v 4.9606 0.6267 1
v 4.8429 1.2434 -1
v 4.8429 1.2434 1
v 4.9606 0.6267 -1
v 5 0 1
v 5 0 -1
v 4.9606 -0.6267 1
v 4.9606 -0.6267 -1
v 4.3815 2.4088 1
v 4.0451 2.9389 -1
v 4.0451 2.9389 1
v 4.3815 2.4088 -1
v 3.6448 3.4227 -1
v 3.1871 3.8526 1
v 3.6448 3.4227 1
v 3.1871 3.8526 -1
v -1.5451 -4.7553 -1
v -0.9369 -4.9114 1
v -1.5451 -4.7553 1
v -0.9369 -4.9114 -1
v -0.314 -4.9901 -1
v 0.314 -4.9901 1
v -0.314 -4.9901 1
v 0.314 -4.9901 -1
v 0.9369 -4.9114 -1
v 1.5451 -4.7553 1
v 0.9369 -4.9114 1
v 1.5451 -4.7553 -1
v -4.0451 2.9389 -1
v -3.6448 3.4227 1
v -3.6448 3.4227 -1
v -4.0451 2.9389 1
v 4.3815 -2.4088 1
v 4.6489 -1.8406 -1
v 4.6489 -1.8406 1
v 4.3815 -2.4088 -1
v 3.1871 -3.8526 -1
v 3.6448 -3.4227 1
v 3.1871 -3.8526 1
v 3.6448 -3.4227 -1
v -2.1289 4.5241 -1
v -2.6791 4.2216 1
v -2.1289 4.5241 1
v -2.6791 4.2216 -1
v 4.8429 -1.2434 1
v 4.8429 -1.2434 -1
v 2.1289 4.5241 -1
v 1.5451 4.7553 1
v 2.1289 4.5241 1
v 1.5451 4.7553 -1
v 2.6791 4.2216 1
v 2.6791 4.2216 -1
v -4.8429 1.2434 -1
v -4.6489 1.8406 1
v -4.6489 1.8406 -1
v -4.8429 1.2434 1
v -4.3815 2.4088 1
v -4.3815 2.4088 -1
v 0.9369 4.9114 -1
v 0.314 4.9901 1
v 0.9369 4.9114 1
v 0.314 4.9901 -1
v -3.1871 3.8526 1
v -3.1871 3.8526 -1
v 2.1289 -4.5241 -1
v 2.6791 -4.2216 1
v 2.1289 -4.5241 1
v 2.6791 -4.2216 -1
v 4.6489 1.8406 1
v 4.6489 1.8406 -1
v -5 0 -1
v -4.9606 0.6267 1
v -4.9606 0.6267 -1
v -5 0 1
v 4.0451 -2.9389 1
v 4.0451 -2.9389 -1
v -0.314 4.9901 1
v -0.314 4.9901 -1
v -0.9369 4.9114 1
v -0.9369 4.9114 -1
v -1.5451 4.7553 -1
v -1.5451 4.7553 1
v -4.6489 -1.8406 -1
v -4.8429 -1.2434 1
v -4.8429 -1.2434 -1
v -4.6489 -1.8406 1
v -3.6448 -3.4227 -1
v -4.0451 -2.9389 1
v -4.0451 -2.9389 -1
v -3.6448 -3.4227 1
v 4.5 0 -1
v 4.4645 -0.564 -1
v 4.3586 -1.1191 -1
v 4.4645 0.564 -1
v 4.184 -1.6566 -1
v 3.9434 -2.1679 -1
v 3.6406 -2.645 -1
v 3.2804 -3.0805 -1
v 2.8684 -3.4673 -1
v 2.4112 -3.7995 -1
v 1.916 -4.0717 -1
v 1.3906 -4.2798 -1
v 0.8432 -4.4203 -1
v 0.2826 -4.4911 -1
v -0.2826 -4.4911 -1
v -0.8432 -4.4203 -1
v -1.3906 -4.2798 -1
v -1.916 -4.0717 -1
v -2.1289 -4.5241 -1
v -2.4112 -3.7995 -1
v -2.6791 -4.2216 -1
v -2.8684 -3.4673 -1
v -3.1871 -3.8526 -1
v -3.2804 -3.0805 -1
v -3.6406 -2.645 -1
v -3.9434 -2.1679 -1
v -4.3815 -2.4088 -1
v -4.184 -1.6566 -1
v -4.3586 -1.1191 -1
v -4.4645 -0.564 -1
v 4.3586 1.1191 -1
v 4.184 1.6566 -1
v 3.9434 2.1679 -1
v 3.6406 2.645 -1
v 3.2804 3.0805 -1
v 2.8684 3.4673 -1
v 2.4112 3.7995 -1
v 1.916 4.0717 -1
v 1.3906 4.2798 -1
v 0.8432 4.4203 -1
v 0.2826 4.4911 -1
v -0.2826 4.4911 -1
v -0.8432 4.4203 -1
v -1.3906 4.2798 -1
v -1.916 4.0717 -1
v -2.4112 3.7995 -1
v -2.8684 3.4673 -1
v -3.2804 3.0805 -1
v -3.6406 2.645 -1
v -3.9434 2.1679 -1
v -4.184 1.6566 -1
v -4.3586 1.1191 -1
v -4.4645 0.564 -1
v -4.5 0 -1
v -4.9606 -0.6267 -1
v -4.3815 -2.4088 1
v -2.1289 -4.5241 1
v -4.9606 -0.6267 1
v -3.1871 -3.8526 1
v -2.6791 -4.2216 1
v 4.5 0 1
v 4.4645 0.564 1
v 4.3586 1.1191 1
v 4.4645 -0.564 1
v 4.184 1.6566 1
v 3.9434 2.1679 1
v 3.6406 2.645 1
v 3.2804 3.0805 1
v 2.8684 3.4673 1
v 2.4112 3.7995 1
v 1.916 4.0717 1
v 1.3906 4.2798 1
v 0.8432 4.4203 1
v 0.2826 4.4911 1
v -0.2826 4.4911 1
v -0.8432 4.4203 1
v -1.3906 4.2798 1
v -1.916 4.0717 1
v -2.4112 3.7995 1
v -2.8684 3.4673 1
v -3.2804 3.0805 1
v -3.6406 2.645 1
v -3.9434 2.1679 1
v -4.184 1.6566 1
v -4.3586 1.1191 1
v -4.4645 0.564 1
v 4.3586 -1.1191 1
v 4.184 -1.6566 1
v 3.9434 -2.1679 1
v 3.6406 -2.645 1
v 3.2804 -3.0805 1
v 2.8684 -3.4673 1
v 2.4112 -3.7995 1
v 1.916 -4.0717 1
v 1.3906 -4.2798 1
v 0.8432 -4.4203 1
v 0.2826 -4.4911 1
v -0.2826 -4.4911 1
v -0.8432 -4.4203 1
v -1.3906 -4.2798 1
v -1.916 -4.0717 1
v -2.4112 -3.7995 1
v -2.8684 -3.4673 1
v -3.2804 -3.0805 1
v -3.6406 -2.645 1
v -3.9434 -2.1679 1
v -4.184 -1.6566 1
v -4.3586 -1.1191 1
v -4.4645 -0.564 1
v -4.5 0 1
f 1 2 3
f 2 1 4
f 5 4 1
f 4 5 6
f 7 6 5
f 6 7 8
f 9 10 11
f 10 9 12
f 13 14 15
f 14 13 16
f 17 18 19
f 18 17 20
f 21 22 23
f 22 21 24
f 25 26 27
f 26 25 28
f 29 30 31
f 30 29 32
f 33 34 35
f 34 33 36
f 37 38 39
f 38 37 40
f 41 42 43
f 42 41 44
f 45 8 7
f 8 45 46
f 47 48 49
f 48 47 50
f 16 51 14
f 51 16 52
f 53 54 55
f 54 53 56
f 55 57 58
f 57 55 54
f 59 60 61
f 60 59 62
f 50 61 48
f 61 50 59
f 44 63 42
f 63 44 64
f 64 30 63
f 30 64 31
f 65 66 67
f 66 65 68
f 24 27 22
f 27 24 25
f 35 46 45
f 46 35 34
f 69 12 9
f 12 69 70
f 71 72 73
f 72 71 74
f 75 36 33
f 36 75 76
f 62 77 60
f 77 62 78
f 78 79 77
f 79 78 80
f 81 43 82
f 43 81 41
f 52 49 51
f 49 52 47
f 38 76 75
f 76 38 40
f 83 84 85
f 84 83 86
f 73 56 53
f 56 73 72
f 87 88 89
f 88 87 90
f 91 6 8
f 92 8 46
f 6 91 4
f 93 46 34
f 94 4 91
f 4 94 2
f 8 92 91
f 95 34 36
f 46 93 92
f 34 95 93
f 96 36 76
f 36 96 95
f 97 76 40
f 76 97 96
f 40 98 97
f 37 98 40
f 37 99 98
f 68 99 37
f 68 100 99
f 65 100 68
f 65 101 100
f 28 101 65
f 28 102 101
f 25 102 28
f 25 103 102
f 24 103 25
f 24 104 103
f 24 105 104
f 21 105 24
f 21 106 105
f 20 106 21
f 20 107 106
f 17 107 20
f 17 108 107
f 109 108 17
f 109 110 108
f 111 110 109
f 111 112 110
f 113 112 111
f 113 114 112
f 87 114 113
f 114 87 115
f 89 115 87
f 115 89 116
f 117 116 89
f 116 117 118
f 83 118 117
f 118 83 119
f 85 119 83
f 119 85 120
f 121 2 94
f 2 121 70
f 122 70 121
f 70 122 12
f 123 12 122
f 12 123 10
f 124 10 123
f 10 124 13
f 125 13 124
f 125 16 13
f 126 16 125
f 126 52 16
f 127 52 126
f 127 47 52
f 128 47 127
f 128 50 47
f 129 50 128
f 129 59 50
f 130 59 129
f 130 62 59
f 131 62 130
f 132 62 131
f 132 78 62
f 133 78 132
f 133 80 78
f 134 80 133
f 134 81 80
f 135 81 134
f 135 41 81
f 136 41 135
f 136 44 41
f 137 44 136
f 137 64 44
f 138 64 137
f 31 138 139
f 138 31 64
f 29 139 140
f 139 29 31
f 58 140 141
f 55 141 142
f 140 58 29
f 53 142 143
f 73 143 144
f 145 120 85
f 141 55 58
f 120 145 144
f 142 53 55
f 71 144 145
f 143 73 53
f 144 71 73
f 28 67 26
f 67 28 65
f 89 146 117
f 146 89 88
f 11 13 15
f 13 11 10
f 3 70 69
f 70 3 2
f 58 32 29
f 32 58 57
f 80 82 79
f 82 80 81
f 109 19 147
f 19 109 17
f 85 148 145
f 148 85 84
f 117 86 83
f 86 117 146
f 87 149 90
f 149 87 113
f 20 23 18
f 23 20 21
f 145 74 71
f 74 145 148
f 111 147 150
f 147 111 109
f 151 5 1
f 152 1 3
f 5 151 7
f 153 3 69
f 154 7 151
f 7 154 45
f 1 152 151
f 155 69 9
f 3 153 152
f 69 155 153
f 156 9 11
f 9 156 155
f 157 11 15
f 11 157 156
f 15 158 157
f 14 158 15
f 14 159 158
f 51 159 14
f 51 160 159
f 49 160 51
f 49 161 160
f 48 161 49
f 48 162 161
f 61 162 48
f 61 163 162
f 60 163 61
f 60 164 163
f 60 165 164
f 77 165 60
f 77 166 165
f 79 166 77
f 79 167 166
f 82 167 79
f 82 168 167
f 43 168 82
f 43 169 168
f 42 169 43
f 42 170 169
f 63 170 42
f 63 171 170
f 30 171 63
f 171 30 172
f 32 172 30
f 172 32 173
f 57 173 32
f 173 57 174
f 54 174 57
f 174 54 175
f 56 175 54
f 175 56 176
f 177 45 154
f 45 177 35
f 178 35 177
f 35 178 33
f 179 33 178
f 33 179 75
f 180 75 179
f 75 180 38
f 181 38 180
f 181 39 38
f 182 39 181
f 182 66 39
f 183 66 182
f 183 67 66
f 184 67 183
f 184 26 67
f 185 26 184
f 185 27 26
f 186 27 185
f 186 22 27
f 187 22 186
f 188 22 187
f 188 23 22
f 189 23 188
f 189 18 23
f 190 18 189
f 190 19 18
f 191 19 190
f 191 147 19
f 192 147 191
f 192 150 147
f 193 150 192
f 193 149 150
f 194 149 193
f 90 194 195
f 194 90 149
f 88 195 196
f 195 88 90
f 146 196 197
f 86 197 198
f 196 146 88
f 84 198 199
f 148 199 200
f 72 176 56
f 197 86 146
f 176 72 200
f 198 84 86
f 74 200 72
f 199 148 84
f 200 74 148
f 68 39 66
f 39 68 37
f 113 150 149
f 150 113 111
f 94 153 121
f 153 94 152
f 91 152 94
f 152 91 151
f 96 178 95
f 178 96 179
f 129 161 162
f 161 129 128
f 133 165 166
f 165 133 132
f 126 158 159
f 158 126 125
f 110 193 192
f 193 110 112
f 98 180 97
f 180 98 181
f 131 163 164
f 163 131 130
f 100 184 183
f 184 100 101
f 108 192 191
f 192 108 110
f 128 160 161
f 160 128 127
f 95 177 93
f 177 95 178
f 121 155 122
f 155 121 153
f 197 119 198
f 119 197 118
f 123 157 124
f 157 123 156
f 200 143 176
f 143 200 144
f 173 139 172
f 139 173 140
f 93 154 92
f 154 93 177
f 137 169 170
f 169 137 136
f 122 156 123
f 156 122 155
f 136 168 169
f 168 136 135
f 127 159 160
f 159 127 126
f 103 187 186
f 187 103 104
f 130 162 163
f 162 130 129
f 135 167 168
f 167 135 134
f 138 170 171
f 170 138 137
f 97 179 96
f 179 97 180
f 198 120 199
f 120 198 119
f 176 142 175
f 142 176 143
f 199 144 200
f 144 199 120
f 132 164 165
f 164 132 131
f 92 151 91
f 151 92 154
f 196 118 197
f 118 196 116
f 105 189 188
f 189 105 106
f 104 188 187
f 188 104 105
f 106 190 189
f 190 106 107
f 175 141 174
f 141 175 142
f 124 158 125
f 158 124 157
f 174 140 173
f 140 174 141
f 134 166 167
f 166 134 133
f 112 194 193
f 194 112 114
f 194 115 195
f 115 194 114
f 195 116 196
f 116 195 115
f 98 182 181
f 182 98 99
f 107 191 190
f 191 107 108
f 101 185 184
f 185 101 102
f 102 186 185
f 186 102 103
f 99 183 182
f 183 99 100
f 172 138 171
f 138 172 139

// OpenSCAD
$fn = 50;


difference() {
	union() {
		translate(v = [0, 0, -1.0000000000]) {
			cylinder(h = 2, r = 5.0000000000);
		}
	}
	union() {
		translate(v = [0, 0, -100.0000000000]) {
			cylinder(h = 200, r = 4.5000000000);
		}
	}
}
